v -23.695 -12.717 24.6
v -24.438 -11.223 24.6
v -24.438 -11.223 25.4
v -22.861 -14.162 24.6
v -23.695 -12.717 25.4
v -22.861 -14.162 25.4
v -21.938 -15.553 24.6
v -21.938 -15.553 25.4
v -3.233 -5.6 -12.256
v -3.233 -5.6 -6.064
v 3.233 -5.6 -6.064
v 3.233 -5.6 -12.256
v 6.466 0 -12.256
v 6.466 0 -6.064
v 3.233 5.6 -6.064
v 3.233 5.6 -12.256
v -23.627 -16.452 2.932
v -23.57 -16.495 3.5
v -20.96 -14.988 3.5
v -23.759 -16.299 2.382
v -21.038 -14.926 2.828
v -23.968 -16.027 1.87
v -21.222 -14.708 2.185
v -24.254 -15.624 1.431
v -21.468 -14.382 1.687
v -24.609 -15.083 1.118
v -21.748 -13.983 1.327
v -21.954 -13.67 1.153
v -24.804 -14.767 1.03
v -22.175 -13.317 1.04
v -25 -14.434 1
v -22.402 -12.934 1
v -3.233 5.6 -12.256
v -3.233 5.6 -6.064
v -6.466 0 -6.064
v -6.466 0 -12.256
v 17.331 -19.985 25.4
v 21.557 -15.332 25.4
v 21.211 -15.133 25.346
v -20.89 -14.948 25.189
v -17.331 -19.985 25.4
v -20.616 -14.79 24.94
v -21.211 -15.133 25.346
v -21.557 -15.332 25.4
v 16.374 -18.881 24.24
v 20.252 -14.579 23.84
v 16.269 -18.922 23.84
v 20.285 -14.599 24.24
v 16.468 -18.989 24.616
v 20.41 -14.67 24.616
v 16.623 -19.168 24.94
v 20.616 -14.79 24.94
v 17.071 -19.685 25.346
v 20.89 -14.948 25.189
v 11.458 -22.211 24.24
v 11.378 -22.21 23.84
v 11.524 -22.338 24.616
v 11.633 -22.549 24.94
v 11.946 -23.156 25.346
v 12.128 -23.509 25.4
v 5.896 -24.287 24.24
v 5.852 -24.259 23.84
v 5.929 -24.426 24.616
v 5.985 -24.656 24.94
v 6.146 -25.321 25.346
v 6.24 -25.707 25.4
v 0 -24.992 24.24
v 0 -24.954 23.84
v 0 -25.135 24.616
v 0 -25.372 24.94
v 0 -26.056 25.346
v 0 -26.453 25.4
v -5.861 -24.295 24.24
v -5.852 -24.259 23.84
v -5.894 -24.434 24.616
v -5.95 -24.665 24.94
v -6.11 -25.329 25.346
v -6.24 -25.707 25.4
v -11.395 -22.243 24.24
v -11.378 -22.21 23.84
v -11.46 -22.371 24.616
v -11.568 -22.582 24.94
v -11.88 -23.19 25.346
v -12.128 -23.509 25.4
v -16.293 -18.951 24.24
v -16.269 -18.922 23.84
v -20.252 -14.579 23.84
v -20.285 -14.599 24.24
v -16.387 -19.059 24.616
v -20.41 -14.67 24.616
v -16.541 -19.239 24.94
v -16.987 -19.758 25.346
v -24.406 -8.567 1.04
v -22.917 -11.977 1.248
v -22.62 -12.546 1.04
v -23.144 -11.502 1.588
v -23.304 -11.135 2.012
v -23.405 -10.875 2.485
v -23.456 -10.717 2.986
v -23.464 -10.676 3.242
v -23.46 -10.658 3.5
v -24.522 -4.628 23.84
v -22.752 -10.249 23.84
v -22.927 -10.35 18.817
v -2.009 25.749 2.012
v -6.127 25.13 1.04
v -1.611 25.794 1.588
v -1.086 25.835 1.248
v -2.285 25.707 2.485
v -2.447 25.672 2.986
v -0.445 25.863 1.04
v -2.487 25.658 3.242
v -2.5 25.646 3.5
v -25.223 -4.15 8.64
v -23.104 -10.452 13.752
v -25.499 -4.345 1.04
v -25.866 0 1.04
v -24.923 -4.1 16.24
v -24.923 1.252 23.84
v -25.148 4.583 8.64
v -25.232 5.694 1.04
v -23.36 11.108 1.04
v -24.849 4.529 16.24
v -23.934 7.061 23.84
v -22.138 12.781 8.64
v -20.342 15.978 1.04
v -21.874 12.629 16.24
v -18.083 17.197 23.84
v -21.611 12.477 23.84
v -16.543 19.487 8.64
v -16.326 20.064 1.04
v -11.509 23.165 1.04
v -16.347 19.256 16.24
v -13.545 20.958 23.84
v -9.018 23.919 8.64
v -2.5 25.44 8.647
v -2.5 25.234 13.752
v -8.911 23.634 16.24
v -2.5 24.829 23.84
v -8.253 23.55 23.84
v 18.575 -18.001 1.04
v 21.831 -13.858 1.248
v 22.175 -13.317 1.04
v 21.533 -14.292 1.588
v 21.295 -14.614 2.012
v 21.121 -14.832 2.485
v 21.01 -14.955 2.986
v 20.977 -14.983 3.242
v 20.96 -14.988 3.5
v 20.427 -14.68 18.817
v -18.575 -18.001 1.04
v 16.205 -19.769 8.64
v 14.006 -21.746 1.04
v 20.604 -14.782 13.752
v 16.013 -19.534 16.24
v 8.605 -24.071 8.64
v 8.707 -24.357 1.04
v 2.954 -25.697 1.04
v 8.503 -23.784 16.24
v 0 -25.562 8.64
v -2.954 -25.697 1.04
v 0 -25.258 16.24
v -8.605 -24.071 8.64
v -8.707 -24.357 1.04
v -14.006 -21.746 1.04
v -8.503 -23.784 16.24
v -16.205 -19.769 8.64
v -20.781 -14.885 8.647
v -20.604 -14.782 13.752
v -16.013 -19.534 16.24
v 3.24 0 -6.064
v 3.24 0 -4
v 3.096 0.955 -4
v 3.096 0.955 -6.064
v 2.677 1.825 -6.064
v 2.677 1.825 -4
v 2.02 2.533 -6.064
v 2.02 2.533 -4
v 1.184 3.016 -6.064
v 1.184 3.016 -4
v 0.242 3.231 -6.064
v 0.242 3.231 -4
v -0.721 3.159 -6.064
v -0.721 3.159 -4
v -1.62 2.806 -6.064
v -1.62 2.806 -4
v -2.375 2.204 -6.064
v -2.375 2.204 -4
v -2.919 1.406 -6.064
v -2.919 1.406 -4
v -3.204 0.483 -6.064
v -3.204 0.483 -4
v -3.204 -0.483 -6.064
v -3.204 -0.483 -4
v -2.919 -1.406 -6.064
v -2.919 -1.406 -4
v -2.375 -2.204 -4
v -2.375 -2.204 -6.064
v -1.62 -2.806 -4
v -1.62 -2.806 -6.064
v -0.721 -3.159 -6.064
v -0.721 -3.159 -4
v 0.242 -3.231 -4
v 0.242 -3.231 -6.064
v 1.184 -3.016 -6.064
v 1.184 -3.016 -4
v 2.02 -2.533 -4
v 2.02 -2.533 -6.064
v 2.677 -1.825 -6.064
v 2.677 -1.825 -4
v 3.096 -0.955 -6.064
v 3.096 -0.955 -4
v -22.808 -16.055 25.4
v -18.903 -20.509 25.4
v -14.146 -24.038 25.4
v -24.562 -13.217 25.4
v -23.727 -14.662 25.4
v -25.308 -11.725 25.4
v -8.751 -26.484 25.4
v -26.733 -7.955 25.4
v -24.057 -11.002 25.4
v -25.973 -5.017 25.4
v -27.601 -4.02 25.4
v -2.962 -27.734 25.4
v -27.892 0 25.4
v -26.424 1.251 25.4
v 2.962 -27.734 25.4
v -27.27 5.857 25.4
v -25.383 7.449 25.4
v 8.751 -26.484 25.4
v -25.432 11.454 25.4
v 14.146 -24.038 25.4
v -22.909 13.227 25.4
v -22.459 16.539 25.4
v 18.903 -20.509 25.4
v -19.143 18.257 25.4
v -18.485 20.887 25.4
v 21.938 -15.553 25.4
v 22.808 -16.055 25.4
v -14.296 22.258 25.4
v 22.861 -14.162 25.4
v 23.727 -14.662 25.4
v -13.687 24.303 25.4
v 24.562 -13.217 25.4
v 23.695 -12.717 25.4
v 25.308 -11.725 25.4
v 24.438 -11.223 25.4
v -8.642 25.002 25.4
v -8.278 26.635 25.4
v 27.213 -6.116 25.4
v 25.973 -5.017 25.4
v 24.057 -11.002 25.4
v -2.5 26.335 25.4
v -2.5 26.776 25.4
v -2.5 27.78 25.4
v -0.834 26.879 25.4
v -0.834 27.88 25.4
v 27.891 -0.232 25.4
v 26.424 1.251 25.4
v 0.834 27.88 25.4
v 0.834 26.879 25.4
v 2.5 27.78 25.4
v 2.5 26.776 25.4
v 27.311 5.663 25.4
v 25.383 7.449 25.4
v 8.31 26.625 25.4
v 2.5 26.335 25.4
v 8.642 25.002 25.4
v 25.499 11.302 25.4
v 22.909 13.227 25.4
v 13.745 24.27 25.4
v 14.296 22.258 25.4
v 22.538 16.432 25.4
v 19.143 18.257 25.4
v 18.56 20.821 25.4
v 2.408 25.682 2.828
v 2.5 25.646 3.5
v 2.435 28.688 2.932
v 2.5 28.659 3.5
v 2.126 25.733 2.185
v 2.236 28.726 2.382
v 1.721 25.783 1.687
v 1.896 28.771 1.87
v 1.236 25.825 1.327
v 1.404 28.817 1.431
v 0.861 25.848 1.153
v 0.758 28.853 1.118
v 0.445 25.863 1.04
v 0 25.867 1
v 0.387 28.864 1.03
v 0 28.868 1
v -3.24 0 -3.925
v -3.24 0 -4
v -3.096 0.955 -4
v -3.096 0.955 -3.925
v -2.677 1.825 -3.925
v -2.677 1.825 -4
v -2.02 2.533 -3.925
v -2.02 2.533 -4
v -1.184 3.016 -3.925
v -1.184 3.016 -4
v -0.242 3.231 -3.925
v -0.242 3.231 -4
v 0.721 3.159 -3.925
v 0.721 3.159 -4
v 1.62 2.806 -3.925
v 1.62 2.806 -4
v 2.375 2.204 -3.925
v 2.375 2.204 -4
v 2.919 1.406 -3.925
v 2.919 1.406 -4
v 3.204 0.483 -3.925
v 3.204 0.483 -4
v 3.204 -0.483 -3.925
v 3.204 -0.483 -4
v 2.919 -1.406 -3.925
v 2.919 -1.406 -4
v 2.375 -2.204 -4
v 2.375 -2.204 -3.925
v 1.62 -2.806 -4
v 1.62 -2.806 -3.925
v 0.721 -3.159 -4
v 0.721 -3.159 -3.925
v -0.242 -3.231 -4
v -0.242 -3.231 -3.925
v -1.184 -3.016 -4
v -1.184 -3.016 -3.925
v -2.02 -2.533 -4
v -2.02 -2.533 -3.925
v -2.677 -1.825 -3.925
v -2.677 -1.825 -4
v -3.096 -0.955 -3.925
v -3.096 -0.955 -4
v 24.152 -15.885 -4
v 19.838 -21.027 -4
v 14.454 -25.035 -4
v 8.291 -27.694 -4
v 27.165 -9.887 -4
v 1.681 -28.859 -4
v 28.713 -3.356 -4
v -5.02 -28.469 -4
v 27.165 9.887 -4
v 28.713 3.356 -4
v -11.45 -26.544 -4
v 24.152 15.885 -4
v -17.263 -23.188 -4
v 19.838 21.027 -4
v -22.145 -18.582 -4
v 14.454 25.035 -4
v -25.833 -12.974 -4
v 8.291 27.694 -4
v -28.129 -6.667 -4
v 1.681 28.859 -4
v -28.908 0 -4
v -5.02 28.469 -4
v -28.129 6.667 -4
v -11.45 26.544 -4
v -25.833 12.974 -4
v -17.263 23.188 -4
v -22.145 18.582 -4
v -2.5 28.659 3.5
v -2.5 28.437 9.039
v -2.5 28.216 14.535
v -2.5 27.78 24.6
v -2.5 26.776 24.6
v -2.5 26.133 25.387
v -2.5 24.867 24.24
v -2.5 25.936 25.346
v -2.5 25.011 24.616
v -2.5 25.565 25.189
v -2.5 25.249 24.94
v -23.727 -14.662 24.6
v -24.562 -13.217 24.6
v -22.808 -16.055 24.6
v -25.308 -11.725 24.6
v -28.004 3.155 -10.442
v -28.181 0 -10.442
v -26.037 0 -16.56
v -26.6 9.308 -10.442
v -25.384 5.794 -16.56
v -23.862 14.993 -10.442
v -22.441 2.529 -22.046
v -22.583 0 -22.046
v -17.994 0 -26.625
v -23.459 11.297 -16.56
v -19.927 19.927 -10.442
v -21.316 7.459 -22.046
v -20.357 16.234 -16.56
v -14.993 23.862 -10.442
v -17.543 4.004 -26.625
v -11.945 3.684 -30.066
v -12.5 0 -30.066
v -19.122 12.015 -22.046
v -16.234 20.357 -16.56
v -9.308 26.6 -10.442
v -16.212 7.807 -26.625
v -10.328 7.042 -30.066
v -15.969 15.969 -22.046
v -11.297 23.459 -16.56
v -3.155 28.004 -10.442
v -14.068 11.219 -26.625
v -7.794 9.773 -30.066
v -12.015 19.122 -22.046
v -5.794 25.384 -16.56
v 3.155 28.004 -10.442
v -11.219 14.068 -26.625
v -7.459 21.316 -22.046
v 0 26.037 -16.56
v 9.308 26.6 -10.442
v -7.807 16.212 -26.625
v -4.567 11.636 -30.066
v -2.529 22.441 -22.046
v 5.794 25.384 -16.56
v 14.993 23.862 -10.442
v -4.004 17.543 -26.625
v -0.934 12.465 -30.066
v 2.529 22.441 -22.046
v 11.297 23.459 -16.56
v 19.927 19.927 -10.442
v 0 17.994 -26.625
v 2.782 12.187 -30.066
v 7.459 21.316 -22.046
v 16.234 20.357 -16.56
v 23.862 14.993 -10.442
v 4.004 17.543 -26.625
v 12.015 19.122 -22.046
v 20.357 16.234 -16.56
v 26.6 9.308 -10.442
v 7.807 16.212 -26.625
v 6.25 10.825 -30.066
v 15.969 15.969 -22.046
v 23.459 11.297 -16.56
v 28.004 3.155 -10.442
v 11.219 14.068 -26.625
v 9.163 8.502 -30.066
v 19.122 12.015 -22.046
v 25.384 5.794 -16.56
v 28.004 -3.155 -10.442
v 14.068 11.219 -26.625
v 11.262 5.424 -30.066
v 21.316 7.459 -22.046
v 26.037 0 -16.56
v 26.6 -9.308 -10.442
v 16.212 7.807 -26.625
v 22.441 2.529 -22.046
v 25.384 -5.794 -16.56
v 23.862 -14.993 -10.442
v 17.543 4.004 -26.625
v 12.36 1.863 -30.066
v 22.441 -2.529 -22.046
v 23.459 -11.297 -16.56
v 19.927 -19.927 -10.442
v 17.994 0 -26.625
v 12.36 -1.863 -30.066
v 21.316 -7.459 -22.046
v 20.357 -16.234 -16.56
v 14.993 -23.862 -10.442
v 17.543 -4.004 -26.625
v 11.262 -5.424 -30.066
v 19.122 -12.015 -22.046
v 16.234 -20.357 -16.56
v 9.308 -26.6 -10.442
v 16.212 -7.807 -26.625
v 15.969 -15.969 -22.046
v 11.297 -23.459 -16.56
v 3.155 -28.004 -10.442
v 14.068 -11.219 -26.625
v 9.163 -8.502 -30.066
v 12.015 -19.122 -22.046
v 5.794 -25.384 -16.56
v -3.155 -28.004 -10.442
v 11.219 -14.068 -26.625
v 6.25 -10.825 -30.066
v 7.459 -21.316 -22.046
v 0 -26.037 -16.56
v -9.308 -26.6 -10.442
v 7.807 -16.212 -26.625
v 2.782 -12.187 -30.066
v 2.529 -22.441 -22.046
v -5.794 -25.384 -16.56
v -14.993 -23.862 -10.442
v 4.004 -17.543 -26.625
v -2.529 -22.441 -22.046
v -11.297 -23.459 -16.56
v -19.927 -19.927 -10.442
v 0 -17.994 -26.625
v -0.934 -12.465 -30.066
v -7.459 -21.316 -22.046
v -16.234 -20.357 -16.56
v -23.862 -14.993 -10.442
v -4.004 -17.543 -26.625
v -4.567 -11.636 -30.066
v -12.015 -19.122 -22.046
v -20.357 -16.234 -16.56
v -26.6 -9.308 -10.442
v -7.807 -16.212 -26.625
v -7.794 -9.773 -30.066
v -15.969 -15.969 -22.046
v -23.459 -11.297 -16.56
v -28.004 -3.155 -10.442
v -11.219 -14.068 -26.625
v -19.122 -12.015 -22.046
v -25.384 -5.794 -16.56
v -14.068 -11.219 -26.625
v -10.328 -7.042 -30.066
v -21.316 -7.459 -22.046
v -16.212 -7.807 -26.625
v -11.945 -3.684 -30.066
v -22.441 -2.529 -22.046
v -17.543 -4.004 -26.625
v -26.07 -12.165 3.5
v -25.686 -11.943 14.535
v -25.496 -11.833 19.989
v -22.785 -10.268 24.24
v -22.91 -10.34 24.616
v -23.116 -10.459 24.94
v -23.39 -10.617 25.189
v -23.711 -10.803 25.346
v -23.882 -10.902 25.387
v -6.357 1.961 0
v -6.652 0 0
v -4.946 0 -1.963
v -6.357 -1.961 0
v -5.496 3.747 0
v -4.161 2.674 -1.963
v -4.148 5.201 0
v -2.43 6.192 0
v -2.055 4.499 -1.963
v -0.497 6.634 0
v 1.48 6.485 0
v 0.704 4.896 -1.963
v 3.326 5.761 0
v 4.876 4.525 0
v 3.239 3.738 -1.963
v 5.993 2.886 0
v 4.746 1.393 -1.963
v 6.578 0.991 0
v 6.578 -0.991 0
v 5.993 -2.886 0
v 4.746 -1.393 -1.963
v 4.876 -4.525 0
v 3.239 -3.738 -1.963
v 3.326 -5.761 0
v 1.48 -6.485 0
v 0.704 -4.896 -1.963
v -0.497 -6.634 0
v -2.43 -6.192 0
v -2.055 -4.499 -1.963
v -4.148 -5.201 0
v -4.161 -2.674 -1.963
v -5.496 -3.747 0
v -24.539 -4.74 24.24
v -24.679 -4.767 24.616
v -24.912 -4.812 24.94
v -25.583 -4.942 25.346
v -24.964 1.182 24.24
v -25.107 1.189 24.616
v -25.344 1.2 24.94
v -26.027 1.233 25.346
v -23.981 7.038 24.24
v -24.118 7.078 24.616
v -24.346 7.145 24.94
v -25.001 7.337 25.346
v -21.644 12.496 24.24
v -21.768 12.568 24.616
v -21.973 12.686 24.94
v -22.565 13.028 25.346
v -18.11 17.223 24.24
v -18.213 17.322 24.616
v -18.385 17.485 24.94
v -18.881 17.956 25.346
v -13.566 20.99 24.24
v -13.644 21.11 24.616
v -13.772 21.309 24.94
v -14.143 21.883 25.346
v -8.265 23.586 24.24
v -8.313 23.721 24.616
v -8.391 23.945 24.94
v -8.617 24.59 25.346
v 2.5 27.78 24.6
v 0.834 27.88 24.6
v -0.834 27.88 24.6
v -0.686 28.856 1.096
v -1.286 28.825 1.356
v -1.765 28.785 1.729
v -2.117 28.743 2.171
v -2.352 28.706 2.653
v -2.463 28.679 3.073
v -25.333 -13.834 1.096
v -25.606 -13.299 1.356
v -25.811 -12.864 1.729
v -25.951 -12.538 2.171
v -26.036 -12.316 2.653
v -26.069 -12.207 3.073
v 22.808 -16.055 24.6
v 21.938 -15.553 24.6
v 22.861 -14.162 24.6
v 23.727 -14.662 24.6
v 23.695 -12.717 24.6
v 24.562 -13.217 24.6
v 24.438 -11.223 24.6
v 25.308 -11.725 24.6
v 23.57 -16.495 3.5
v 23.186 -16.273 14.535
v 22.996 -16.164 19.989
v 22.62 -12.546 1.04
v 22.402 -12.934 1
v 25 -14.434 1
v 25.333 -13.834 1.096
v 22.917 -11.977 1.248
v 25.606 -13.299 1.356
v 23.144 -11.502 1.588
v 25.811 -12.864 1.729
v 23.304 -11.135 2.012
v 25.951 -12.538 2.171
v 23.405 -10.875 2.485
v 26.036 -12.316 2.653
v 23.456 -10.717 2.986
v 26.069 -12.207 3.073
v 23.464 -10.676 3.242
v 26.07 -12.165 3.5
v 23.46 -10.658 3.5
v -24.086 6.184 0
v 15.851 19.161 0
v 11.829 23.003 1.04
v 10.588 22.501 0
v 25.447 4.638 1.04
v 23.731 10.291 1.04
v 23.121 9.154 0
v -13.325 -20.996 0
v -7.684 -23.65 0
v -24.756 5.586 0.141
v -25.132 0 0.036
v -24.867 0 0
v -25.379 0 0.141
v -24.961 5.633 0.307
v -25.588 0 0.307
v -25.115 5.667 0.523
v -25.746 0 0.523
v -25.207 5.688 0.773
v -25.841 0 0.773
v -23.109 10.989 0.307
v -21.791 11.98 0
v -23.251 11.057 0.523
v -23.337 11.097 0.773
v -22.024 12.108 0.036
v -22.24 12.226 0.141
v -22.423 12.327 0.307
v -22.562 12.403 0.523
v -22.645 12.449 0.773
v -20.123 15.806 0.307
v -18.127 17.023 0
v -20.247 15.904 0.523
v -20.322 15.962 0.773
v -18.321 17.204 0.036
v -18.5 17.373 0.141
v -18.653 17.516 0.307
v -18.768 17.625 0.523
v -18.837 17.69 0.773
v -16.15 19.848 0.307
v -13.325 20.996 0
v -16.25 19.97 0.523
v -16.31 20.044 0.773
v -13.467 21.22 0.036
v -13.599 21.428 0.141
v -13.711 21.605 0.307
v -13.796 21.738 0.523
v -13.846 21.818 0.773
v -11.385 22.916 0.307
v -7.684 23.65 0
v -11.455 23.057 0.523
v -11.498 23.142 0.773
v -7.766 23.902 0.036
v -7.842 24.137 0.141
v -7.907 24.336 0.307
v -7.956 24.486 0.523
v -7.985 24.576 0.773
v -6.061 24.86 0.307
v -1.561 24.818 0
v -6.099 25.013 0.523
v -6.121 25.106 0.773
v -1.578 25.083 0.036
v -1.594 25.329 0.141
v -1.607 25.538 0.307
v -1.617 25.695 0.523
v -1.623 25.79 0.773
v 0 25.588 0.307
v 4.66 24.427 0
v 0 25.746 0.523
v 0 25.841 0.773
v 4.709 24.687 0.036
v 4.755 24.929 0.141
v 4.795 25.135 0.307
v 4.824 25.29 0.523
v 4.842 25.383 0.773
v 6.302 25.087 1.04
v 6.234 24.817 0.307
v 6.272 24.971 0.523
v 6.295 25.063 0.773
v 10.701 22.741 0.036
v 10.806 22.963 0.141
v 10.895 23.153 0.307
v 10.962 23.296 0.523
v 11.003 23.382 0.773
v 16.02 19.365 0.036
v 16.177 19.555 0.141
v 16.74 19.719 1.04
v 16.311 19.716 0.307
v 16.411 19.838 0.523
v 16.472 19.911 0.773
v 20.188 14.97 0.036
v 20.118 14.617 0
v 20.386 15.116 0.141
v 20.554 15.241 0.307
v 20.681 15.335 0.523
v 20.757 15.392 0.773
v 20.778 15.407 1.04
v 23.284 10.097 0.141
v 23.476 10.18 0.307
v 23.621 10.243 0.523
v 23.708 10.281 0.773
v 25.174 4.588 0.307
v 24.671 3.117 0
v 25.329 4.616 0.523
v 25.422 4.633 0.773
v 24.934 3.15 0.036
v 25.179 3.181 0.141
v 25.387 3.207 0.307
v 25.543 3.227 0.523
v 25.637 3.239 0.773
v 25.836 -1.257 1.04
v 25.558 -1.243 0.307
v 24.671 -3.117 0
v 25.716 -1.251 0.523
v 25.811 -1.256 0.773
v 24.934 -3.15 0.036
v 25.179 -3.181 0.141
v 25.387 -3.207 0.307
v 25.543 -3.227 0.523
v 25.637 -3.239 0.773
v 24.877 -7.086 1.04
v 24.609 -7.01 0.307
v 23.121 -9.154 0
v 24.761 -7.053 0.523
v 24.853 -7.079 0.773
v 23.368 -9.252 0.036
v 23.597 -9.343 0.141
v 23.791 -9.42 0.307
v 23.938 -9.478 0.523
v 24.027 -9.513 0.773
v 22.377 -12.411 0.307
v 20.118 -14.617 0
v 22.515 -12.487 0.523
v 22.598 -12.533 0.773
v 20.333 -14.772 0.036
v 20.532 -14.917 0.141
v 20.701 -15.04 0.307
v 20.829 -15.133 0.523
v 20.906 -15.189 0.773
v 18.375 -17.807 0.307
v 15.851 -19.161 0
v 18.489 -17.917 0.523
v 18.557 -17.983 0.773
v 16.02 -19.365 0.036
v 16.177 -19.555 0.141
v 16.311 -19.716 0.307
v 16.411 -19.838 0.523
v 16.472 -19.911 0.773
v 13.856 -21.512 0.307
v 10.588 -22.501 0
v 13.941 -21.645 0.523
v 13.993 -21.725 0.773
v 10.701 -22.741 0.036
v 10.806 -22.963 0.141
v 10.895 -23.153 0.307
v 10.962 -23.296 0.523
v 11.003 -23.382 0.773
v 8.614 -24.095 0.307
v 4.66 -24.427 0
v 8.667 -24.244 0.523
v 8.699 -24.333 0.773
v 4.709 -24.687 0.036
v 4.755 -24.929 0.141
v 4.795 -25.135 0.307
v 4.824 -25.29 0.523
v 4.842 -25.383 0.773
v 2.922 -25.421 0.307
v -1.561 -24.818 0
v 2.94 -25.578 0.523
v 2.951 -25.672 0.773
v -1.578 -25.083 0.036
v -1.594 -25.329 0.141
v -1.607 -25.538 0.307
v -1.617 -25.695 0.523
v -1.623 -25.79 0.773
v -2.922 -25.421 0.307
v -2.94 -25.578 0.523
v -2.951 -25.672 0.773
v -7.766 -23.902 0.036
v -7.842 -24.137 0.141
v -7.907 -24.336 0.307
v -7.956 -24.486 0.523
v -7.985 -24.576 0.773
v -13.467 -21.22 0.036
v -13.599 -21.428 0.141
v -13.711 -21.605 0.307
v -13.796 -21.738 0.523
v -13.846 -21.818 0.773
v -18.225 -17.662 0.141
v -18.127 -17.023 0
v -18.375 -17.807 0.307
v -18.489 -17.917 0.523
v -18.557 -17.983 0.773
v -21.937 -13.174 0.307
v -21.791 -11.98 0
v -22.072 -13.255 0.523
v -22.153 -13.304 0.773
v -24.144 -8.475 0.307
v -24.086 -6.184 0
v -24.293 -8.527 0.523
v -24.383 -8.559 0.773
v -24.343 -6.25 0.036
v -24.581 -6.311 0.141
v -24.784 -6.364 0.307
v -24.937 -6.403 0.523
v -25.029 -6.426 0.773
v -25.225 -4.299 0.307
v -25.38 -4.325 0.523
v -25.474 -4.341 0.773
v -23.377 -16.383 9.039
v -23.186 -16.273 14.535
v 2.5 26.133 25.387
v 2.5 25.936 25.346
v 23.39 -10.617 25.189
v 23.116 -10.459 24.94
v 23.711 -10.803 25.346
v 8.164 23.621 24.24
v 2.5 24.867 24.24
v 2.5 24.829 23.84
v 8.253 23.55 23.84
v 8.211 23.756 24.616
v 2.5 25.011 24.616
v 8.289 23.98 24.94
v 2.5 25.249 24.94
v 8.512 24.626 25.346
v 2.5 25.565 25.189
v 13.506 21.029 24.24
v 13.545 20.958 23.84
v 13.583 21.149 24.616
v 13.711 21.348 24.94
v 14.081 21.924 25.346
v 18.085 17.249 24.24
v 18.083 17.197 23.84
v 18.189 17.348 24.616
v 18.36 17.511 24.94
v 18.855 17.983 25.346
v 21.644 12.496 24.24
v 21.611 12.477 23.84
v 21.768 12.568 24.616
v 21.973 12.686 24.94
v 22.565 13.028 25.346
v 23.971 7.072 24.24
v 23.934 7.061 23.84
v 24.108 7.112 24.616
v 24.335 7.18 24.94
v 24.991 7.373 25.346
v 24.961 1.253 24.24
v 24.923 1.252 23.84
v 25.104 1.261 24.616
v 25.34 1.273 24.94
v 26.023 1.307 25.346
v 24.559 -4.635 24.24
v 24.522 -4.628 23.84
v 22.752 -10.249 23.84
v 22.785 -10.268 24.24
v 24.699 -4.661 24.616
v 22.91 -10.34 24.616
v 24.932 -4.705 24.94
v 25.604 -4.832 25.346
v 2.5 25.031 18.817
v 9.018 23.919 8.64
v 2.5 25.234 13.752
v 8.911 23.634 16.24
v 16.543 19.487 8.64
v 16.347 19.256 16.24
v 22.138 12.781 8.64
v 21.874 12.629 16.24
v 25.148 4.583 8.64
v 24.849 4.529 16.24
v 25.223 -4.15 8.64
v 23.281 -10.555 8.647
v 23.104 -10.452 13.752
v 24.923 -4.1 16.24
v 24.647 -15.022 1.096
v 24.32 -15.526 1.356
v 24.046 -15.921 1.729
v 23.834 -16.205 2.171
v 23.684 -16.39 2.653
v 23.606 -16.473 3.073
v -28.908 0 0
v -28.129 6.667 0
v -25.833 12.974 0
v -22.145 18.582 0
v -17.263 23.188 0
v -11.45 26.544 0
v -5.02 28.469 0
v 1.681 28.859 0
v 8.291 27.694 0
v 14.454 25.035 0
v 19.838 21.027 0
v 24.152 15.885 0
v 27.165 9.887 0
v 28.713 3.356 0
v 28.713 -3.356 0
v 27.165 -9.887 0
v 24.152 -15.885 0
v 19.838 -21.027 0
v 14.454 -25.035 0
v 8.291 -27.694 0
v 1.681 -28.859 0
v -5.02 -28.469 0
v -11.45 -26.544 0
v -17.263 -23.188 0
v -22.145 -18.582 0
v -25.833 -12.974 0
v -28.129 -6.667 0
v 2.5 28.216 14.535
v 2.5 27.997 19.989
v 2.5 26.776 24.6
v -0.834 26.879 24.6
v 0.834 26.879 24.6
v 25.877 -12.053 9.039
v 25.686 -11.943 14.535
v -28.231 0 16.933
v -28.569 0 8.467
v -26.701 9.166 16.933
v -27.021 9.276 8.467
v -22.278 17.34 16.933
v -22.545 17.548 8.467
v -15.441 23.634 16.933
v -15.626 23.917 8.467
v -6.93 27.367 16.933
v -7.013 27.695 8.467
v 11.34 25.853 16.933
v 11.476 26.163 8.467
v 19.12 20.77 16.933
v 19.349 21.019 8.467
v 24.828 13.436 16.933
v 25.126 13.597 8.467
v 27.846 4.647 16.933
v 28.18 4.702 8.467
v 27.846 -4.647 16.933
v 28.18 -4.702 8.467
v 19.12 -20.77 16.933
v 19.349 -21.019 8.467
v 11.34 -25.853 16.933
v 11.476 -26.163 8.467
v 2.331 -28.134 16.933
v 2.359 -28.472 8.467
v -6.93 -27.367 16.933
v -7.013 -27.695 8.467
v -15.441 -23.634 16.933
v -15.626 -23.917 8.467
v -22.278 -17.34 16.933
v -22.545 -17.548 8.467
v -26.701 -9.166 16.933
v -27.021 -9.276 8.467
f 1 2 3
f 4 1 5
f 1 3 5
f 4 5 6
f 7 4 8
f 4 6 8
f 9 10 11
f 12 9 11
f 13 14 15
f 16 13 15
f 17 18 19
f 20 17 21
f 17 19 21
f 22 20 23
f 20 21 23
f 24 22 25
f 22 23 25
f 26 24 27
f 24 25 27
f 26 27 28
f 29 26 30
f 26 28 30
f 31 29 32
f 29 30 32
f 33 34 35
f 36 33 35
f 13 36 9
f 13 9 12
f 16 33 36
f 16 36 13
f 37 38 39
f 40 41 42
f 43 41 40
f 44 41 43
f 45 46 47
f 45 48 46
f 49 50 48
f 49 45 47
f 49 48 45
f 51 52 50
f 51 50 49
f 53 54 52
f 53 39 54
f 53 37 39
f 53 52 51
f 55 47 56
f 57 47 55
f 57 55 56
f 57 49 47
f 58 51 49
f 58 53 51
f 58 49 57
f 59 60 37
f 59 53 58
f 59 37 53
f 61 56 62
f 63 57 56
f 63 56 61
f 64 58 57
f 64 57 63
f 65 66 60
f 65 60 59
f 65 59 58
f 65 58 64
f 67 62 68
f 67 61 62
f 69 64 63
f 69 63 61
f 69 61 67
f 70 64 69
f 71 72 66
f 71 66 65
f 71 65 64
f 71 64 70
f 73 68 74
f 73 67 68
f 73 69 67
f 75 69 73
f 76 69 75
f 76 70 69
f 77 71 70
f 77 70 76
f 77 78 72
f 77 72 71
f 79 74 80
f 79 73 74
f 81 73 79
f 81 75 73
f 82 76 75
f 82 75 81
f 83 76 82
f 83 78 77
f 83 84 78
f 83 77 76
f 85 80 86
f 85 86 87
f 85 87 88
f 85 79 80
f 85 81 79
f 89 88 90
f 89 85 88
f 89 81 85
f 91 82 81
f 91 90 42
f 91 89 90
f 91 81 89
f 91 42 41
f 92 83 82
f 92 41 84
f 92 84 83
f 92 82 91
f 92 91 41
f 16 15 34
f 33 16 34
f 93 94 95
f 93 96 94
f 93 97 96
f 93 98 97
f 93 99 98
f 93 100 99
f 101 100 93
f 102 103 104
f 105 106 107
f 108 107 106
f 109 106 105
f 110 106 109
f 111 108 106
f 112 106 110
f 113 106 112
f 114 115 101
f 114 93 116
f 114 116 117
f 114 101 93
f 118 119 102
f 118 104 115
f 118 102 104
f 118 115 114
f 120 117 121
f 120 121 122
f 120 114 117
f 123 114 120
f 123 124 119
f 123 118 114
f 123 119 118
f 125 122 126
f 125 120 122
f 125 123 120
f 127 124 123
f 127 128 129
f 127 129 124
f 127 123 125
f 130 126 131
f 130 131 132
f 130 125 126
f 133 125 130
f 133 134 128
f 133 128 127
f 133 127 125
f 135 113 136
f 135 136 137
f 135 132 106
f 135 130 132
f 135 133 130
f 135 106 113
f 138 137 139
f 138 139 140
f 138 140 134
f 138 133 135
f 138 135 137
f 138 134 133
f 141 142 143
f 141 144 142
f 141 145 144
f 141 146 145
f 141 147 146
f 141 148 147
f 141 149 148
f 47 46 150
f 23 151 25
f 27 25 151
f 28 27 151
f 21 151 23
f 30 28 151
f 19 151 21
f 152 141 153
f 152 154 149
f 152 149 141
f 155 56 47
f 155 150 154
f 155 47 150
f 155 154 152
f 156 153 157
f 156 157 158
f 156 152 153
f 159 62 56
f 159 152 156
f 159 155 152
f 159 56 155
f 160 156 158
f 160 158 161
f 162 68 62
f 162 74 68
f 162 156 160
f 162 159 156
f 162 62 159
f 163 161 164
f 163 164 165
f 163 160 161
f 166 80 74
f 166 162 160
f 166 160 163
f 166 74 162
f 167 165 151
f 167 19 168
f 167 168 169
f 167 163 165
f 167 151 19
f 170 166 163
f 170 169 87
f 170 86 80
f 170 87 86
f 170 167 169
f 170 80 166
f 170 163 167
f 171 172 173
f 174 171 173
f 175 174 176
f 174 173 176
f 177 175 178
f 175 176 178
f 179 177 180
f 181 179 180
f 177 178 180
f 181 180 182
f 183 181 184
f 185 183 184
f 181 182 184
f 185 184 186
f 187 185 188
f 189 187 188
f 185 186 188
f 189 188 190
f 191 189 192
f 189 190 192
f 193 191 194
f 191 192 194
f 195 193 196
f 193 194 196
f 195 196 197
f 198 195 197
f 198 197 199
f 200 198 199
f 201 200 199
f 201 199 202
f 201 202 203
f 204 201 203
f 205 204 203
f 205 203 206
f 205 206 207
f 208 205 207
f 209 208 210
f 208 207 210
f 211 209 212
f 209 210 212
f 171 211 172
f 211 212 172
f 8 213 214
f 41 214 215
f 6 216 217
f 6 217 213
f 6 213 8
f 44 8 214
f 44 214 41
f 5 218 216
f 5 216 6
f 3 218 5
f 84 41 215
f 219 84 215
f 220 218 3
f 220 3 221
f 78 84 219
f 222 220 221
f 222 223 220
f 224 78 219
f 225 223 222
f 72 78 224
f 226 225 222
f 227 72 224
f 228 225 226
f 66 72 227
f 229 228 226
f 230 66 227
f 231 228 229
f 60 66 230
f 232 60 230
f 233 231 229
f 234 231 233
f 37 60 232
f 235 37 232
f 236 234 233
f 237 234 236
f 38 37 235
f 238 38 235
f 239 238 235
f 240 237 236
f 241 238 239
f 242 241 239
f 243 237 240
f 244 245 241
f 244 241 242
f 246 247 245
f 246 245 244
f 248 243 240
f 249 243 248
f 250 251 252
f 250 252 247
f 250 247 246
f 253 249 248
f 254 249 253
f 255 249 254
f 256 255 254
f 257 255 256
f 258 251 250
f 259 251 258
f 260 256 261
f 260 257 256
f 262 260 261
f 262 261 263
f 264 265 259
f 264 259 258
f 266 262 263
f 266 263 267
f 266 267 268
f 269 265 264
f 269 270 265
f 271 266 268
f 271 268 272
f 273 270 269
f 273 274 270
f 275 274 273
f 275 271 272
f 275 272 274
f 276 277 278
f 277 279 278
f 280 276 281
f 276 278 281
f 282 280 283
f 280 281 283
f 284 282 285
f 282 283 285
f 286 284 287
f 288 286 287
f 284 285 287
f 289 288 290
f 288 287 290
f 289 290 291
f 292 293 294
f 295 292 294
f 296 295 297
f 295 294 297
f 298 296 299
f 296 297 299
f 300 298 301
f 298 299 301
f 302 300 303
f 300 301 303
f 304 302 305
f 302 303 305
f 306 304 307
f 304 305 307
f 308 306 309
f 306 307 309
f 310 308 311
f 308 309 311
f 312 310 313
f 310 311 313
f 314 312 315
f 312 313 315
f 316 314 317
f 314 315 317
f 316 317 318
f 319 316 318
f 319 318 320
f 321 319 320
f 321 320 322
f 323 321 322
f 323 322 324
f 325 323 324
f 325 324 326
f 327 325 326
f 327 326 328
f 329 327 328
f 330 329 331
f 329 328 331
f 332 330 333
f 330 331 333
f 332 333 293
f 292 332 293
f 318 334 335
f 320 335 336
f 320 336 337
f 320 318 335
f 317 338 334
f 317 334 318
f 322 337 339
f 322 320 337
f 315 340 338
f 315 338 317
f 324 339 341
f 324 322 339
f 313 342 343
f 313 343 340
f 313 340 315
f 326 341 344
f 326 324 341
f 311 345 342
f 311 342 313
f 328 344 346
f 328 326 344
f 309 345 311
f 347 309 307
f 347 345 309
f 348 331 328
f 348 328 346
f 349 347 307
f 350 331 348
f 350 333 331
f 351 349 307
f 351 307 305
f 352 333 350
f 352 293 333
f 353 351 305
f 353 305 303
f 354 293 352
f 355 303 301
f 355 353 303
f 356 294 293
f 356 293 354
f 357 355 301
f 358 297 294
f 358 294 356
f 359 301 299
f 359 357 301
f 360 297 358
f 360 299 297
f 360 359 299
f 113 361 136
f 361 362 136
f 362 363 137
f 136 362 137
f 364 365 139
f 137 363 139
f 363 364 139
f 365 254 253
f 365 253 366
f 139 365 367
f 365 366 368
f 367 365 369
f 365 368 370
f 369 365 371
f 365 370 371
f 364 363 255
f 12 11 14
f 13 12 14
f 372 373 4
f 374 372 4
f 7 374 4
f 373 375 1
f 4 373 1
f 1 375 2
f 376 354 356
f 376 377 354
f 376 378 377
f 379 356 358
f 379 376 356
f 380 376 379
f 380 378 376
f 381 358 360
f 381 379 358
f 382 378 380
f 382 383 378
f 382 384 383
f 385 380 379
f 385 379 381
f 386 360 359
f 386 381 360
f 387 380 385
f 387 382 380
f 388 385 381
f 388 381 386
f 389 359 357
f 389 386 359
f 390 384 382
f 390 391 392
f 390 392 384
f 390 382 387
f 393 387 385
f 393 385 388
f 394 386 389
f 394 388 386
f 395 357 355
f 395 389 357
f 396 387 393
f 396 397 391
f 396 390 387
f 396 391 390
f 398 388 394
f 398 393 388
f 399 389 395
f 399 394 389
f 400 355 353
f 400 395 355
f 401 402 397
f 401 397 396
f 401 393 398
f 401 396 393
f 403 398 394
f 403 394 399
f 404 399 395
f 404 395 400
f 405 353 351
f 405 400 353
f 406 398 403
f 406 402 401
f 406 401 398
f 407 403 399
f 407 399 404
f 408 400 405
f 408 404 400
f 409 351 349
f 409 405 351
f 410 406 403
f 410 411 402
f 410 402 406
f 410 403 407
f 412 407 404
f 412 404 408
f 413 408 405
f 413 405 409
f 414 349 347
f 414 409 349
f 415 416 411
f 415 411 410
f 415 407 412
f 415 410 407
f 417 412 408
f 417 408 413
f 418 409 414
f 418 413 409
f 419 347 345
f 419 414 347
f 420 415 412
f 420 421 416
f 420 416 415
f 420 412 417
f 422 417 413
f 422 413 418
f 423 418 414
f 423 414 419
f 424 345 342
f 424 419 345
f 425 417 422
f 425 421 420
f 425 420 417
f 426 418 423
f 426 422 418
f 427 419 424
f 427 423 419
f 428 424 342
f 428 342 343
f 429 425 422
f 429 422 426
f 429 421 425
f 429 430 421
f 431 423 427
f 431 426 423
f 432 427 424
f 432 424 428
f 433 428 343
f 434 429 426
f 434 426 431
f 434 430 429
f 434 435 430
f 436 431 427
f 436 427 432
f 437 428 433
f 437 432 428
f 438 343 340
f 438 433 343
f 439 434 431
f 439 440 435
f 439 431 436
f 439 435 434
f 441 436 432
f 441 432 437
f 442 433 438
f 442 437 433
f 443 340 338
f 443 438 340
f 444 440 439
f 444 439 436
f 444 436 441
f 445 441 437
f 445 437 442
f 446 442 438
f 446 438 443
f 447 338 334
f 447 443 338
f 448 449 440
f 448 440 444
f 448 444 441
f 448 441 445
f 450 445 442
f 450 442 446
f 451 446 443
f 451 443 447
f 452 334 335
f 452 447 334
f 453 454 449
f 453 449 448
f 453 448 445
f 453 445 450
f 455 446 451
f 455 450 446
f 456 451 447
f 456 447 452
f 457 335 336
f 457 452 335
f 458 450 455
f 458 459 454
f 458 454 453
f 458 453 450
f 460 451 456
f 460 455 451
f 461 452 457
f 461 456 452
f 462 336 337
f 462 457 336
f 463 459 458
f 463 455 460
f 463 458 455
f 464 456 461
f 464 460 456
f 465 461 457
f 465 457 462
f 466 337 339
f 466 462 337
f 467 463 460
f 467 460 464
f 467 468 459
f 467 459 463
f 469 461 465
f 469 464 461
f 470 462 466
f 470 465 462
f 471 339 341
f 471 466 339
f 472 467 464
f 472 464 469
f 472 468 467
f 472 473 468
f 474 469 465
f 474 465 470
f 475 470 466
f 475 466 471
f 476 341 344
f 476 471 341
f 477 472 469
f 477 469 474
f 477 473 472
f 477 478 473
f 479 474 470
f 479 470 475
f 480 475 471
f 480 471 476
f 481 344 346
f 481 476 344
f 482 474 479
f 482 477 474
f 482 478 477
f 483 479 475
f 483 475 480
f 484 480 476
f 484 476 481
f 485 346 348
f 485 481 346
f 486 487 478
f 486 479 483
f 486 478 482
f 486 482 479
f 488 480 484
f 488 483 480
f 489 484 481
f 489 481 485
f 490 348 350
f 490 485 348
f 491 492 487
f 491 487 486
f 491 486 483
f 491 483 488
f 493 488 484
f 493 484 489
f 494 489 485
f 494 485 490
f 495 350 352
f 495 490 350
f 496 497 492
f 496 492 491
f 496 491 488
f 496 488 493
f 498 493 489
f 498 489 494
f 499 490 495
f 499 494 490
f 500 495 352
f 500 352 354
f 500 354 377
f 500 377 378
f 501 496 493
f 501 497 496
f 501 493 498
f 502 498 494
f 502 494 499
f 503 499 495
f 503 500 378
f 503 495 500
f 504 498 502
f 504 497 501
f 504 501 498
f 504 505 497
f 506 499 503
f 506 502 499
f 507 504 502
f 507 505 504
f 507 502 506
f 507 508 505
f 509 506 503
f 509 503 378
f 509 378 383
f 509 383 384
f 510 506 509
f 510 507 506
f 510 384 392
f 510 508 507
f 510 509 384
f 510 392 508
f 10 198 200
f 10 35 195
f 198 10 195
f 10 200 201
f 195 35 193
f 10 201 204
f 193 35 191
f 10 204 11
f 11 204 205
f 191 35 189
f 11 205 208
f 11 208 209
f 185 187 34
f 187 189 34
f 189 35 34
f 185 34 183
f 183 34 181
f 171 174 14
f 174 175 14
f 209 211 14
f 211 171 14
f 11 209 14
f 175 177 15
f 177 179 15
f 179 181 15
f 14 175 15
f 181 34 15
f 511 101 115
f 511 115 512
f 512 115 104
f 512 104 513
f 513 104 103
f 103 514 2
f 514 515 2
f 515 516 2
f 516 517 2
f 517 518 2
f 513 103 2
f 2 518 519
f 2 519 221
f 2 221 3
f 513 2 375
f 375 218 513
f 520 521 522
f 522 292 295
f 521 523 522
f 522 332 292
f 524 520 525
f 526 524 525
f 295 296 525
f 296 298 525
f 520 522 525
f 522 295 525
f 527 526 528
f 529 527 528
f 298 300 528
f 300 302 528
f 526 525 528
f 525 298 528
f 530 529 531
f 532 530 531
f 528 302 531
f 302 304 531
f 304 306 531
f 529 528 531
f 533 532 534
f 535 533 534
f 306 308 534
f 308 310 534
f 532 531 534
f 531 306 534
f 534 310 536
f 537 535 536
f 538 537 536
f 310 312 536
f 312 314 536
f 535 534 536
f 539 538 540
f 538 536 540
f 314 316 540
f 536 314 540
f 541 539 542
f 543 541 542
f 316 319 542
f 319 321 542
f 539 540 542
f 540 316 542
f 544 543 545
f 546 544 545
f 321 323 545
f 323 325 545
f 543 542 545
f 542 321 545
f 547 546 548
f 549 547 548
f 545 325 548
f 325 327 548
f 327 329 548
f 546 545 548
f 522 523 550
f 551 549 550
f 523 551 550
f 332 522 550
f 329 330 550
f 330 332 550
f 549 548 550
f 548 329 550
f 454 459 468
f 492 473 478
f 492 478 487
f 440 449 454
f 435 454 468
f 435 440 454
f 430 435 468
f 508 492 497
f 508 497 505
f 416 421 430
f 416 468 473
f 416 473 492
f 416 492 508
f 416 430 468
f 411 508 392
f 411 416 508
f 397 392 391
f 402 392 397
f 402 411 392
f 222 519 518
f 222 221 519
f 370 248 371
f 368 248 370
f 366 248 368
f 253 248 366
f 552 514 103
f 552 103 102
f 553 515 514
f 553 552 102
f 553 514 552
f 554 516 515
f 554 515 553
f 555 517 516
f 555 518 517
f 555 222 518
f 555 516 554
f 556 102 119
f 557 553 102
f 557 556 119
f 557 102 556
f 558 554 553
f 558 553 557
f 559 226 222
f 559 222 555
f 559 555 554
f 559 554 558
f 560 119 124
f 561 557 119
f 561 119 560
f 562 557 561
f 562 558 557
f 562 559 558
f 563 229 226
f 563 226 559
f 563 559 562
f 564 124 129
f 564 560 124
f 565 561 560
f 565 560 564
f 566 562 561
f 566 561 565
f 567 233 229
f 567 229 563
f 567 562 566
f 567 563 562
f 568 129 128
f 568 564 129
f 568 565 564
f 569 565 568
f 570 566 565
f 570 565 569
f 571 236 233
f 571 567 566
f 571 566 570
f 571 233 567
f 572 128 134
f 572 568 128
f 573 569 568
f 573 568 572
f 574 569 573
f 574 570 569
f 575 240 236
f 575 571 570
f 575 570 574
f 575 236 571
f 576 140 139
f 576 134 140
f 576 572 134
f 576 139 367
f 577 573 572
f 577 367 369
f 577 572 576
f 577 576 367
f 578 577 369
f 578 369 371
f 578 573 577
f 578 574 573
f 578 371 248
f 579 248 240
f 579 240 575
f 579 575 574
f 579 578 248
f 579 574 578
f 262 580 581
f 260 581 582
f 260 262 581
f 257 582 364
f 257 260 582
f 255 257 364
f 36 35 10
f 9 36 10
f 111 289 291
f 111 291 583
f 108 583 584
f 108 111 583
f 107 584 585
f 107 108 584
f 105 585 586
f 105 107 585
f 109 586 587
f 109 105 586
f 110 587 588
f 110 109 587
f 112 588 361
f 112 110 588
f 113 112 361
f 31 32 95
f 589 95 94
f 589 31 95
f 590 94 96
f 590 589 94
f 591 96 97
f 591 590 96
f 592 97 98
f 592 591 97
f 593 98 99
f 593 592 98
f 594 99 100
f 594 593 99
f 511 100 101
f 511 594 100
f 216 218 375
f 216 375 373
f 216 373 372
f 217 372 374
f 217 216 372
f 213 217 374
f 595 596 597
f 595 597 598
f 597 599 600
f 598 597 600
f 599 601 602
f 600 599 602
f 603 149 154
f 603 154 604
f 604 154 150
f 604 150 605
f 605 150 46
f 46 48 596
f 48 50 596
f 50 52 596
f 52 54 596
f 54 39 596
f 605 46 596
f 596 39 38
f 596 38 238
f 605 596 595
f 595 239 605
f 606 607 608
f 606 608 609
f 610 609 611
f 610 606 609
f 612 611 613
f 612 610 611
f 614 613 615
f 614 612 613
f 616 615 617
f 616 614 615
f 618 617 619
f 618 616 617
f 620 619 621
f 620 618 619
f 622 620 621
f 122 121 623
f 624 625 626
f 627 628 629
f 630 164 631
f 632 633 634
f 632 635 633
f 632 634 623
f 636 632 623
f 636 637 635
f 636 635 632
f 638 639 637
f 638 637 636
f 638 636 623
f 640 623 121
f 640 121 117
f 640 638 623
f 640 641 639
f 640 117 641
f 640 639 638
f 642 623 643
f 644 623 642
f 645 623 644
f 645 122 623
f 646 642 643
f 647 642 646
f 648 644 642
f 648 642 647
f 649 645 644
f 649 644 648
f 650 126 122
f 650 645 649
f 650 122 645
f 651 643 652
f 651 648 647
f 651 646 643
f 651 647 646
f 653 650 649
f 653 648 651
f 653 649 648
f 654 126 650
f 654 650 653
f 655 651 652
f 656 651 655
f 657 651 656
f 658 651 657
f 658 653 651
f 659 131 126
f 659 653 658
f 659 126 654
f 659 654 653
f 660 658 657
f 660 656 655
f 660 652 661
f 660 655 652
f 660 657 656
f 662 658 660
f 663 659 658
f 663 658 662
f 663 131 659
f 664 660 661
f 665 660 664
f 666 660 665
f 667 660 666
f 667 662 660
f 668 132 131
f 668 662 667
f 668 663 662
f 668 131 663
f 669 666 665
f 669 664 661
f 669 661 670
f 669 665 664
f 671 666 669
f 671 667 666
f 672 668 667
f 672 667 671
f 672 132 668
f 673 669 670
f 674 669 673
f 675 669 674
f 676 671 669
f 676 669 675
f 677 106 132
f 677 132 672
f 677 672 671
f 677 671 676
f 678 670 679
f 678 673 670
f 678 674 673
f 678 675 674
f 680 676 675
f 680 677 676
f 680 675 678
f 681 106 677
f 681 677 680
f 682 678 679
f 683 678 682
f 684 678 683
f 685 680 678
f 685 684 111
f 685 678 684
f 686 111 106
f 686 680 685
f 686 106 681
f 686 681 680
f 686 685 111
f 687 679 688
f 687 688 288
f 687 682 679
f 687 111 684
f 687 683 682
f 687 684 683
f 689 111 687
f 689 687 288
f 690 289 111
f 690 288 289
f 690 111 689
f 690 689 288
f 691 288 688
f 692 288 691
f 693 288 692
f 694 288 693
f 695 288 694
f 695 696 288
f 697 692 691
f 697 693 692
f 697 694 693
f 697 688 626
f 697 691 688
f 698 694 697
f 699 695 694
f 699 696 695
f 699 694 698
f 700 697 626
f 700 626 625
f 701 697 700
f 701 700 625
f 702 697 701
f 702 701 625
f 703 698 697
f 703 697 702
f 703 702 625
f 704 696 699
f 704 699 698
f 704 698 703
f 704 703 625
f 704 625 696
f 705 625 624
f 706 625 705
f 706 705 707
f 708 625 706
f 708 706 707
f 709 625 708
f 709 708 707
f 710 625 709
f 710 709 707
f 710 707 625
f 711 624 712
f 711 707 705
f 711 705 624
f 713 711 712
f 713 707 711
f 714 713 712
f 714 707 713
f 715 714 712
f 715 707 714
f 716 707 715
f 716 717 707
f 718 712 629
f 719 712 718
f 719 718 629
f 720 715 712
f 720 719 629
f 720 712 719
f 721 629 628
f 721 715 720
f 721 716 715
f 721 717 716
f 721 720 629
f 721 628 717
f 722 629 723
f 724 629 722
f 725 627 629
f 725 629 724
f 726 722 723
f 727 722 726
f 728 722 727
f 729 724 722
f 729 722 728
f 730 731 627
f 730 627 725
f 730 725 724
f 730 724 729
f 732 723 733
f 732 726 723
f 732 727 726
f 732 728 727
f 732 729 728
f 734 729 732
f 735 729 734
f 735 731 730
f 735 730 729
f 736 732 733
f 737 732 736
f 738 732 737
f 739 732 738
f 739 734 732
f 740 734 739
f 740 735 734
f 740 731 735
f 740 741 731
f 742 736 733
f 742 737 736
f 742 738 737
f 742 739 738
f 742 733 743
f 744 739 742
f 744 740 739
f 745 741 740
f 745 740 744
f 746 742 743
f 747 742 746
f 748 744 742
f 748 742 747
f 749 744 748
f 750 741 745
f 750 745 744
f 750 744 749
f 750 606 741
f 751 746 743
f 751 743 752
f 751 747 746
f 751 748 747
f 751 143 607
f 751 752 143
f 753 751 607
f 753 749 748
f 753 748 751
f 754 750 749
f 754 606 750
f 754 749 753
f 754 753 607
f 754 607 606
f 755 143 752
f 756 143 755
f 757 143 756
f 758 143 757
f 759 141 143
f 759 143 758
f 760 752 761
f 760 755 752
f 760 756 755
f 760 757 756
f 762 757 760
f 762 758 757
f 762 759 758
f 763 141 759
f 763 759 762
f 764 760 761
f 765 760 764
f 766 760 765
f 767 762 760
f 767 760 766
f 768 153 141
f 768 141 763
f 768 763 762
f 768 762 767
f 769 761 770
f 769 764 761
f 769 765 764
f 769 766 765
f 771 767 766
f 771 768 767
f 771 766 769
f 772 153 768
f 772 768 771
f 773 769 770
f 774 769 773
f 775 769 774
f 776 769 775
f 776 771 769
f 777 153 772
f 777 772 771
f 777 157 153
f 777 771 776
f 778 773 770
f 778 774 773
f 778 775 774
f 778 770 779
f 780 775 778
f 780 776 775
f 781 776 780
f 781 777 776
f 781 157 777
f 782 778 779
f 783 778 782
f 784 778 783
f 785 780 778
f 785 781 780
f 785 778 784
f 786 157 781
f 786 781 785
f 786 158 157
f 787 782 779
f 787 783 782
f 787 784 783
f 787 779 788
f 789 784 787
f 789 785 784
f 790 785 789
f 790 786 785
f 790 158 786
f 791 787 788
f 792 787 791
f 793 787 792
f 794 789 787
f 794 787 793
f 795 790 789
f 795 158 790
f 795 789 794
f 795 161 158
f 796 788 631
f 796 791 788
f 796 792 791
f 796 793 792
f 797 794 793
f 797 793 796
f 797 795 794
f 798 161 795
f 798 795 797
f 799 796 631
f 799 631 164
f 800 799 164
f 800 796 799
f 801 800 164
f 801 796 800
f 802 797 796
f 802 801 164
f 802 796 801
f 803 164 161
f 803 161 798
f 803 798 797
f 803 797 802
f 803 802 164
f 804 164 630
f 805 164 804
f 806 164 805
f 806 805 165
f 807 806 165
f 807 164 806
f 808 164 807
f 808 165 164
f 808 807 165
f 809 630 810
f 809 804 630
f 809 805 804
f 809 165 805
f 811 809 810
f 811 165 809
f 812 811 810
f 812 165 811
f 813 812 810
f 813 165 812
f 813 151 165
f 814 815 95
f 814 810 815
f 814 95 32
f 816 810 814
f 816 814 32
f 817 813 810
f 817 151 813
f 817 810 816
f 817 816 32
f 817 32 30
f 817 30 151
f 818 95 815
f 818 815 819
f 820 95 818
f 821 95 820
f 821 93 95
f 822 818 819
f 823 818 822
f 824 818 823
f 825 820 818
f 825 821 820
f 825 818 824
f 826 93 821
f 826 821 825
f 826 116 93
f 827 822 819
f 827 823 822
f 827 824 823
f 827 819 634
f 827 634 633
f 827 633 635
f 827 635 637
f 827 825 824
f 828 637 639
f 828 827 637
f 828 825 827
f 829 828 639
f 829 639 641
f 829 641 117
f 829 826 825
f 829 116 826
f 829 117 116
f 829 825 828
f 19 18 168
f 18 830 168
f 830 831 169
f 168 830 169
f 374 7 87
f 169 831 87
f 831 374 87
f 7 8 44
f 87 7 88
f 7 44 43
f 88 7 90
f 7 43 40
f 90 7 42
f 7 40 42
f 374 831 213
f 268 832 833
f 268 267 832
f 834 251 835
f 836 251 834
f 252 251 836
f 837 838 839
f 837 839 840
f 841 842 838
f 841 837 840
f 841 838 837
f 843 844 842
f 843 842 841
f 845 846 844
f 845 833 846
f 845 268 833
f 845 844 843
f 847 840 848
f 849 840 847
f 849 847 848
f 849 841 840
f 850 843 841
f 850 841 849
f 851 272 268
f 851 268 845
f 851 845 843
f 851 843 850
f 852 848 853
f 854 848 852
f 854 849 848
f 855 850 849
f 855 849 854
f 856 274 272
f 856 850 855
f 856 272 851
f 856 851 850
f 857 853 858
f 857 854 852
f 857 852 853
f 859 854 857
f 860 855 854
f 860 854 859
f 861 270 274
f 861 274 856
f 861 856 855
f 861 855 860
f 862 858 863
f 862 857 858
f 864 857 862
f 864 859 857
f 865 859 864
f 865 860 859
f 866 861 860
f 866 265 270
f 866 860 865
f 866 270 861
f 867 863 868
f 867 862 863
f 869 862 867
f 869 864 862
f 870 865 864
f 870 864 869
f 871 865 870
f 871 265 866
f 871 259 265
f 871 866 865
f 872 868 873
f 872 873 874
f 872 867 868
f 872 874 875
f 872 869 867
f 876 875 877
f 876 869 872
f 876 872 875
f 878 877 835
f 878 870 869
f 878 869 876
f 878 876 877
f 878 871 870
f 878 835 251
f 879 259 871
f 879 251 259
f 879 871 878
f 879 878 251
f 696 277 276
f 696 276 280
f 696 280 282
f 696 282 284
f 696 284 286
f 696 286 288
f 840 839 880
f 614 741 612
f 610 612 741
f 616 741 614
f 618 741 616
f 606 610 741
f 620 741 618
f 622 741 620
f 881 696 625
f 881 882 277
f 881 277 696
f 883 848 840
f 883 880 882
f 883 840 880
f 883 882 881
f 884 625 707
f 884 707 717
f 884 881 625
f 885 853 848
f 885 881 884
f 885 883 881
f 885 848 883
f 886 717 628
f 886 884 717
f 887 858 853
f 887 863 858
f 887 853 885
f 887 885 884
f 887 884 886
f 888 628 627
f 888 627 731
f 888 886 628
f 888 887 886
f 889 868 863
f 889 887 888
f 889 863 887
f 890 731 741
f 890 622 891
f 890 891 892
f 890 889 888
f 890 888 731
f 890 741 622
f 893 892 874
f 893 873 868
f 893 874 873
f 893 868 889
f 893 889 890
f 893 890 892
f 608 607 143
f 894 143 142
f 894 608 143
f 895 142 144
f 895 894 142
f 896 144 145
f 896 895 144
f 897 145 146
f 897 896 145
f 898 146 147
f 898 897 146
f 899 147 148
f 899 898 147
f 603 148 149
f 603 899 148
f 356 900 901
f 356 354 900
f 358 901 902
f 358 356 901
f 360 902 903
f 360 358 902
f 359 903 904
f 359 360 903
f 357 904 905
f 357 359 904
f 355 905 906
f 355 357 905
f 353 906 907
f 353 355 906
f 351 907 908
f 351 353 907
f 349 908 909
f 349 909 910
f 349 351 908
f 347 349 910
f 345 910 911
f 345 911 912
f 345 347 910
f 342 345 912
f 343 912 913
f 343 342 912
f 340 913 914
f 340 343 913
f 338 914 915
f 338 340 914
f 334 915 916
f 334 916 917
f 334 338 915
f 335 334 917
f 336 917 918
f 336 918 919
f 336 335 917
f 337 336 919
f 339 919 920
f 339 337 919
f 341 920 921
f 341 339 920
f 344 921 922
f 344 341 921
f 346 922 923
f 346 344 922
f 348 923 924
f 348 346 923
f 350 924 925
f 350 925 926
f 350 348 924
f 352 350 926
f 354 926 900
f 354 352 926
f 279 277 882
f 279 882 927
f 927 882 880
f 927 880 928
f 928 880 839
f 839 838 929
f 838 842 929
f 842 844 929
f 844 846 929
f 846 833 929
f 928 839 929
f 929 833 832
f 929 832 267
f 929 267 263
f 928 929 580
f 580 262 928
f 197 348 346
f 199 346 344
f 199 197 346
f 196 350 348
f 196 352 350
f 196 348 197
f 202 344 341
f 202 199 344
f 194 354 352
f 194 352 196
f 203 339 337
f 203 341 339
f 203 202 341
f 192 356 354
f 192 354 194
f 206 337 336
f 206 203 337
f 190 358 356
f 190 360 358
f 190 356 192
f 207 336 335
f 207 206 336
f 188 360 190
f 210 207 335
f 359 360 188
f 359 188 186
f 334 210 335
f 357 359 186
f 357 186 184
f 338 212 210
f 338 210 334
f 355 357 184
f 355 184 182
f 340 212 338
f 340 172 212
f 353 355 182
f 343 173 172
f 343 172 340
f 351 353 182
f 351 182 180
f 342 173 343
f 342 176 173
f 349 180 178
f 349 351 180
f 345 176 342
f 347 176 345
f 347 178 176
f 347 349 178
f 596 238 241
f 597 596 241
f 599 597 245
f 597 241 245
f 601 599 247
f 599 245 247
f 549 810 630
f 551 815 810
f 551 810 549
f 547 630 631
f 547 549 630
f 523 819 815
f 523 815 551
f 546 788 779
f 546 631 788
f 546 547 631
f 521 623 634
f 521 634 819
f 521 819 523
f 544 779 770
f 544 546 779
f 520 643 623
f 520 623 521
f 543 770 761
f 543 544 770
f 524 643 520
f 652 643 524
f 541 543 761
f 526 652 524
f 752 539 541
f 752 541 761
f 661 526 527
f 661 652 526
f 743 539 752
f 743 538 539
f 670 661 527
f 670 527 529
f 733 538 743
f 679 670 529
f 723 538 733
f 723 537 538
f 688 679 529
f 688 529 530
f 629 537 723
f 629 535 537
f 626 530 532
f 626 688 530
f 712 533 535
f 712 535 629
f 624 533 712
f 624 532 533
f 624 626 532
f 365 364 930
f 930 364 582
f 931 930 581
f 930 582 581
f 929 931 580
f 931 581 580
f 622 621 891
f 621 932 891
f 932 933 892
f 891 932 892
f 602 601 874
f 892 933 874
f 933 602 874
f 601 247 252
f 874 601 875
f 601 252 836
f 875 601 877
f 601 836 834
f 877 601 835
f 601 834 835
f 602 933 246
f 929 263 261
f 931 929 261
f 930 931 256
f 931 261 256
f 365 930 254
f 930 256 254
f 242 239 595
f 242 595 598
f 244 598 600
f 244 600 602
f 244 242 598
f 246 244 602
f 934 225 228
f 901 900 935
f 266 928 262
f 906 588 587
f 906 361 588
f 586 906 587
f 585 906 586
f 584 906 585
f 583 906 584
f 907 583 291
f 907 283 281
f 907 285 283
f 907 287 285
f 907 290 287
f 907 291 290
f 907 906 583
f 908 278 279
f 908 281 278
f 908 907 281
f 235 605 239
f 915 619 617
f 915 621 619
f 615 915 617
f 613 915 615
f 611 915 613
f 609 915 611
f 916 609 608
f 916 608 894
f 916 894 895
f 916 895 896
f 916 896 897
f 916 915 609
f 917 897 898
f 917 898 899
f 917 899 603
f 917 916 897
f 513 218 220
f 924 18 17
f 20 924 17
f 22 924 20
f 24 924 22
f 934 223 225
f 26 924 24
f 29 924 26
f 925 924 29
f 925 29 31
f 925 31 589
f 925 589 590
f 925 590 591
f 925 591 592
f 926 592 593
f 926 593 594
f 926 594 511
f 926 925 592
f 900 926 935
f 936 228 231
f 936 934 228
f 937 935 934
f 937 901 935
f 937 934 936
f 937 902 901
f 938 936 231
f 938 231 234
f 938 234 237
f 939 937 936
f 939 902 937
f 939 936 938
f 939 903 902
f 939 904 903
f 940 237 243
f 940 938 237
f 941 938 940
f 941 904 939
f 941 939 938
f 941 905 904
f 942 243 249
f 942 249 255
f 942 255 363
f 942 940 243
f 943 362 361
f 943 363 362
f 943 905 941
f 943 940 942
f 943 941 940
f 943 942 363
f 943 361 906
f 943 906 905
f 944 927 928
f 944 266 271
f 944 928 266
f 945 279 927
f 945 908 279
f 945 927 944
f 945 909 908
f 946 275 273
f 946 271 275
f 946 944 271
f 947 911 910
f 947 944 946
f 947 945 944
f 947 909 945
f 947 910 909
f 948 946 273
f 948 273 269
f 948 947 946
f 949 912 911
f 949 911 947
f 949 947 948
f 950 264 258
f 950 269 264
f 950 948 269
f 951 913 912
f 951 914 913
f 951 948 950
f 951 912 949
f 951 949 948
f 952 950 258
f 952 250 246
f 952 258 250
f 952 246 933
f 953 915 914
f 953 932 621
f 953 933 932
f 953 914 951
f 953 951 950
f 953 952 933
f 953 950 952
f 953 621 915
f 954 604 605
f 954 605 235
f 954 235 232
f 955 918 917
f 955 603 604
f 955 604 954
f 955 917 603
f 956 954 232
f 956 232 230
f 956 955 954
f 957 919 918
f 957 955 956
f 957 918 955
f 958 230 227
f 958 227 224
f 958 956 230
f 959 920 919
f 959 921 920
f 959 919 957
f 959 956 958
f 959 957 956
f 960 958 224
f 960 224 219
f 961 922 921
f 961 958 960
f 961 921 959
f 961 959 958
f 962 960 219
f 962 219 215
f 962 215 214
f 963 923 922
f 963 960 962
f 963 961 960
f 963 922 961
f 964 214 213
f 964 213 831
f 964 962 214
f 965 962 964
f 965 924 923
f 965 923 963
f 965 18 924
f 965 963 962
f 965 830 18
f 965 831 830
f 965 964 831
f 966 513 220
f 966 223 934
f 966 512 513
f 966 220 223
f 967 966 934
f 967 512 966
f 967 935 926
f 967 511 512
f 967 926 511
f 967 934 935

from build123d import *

# Parameters (mm, degrees)
F2_R      = 1
F3_R      = 1.5
F5_DEPTH  = 24.4
F6_F1_R   = 2.5
F6_F2_R   = 2.5
F6_F3_R   = 2.5
F6_F4_R   = 2.4999
F6_F5_R   = 2.4999
F6_F6_R   = 2.4999
F8_W      = 6.6521469513
F8_H      = 11.3077862186
F13_DEPTH = 6.192
F16_R     = 3.24
F17_DEPTH = 2.064
F7_R      = 27.892
F7_R_2    = 26.892
F18_DEPTH = 0.8


# Not quite as in the source:
# - a fillet or chamfer is up to 0.001 mm smaller than in the source, because OpenCascade refuses the exact size


with BuildPart() as f1:
    # F0 (on Front) → F1 (revolve)
    with BuildSketch(Plane.XZ):
        Polygon((0, -4), (0, 0), (-25.908, 0), (-24.892, 25.4), (-27.892, 25.4), (-28.908, 0), (-28.908, -4), align=None)
    revolve(axis=Axis((0, 0, -2), (0, 0, -1)))

    # F2
    f2_edges = [f1.edges().sort_by_distance(p)[0] for p in [
        (25.908, 0, 0),
    ]]
    fillet(f2_edges, radius=F2_R)

    # F3
    f3_edges = [f1.edges().sort_by_distance(p)[0] for p in [
        (24.892, 0, 25.4),
    ]]
    fillet(f3_edges, radius=F3_R)

    # F4 (on face) → F5 (cut)
    with BuildSketch(Plane.XY.offset(25.4)):
        Polygon((2.5, 32.8202601522), (-2.5, 32.8202601522), (-2.5, 1.443375673), (-1.25, 2.1650635095), (0, 0), (1.25, 2.1650635095), (2.5, 1.443375673), align=None)
        Polygon((-1.25, 2.1650635095), (-2.5, 1.443375673), (-2.5, 0), (0, 0), align=None)
        Polygon((-2.5, 0), (-2.5, 1.443375673), (-29.6731790506, -14.2450665666), (-27.1731790506, -18.5751935856), (0, -2.8867513459), (-1.25, -2.1650635095), (0, 0), align=None)
        Polygon((29.6731790506, -14.2450665666), (2.5, 1.443375673), (2.5, 0), (0, 0), (1.25, -2.1650635095), (0, -2.8867513459), (27.1731790506, -18.5751935856), align=None)
        Polygon((2.5, 0), (2.5, 1.443375673), (1.25, 2.1650635095), (0, 0), align=None)
        Polygon((1.25, -2.1650635095), (0, 0), (-1.25, -2.1650635095), (0, -2.8867513459), align=None)
    extrude(amount=-F5_DEPTH, mode=Mode.SUBTRACT)

    # F6: fillet of radius 2.5 on 6 edges, made by hand

    # F6_f1
    f6_f1_edges = [f1.edges().sort_by_distance(p)[0] for p in [
        (-22.351639831, -15.7914766192, 1),
    ]]
    fillet(f6_f1_edges, radius=F6_F1_R)

    # F6_f2
    f6_f2_edges = [f1.edges().sort_by_distance(p)[0] for p in [
        (2.5, 27.2528262195, 1),
    ]]
    fillet(f6_f2_edges, radius=F6_F2_R)

    # F6_f3
    f6_f3_edges = [f1.edges().sort_by_distance(p)[0] for p in [
        (22.351639831, -15.7914766192, 1),
    ]]
    fillet(f6_f3_edges, radius=F6_F3_R)

    # F6_f4 (radius 2.5 in the source; OpenCascade refuses exactly that, so slightly less here)
    f6_f4_edges = [f1.edges().sort_by_distance(p)[0] for p in [
        (-24.851639831, -11.4613496003, 1),
    ]]
    fillet(f6_f4_edges, radius=F6_F4_R)

    # F6_f5 (radius 2.5 in the source; OpenCascade refuses exactly that, so slightly less here)
    f6_f5_edges = [f1.edges().sort_by_distance(p)[0] for p in [
        (24.851639831, -11.4613496003, 1),
    ]]
    fillet(f6_f5_edges, radius=F6_F5_R)

    # F6_f6 (radius 2.5 in the source; OpenCascade refuses exactly that, so slightly less here)
    f6_f6_edges = [f1.edges().sort_by_distance(p)[0] for p in [
        (-2.5, 27.2528262195, 1),
    ]]
    fillet(f6_f6_edges, radius=F6_F6_R)

    # F8 (on Front) → F9 (revolve, cut)
    with BuildSketch(Plane.XZ):
        with Locations((-3.3260734756, 5.6538931093)):
            Rectangle(F8_W, F8_H)
        Polygon((0, -15.6807032946), (0, 0), (-6.6521469513, 0), (-3.24, -3.9252260535), (-3.24, -15.6807032946), (-3.175, -15.6807032946), align=None)
    revolve(axis=Axis((0, 0, -2.186458538), (0, 0, -1)), mode=Mode.SUBTRACT)

    # F7 (on face) → F18 (join)
    with BuildSketch(Plane.XY.offset(25.4)):
        Circle(F7_R)
        Circle(F7_R_2, mode=Mode.SUBTRACT)
    extrude(amount=-F18_DEPTH)


with BuildPart() as f11:
    # F10 (on Front) → F11 (revolve)
    with BuildSketch(Plane.XZ):
        with BuildLine():
            Line((0, -4), (-28.908, -4))
            ThreePointArc((-28.908, -4), (-24.4644892038, -19.40004), (-12.5, -30.0657335212))
            Line((-12.5, -30.0657335212), (0, -30.0657335212))
            Line((0, -30.0657335212), (0, -4))
        make_face()
    revolve(axis=Axis((0, 0, -17.0328667606), (0, 0, -1)))


with BuildPart() as f13:
    # F12 (on face) → F13 (new body)
    with BuildSketch(Plane.XY.offset(-4)):
        Polygon((3.2331615075, 5.6), (-3.2331615075, 5.6), (-6.4663230149, 0), (-3.2331615075, -5.6), (3.2331615075, -5.6), (6.4663230149, 0), align=None)
    extrude(amount=-F13_DEPTH)


with BuildPart() as f13_1:
    # F14: moved
    add(f13.part.moved(Location((0, 0, -2.064))))


with BuildPart() as f11_1:
    add(f11.part)

    # F15: cut F13
    add(f13_1.part, mode=Mode.SUBTRACT)

    # F16 (on face) → F17 (cut)
    with BuildSketch(Plane.XY.offset(-4)):
        Circle(F16_R)
    extrude(amount=-F17_DEPTH, mode=Mode.SUBTRACT)


solid = Compound([f1.part, f11_1.part])
